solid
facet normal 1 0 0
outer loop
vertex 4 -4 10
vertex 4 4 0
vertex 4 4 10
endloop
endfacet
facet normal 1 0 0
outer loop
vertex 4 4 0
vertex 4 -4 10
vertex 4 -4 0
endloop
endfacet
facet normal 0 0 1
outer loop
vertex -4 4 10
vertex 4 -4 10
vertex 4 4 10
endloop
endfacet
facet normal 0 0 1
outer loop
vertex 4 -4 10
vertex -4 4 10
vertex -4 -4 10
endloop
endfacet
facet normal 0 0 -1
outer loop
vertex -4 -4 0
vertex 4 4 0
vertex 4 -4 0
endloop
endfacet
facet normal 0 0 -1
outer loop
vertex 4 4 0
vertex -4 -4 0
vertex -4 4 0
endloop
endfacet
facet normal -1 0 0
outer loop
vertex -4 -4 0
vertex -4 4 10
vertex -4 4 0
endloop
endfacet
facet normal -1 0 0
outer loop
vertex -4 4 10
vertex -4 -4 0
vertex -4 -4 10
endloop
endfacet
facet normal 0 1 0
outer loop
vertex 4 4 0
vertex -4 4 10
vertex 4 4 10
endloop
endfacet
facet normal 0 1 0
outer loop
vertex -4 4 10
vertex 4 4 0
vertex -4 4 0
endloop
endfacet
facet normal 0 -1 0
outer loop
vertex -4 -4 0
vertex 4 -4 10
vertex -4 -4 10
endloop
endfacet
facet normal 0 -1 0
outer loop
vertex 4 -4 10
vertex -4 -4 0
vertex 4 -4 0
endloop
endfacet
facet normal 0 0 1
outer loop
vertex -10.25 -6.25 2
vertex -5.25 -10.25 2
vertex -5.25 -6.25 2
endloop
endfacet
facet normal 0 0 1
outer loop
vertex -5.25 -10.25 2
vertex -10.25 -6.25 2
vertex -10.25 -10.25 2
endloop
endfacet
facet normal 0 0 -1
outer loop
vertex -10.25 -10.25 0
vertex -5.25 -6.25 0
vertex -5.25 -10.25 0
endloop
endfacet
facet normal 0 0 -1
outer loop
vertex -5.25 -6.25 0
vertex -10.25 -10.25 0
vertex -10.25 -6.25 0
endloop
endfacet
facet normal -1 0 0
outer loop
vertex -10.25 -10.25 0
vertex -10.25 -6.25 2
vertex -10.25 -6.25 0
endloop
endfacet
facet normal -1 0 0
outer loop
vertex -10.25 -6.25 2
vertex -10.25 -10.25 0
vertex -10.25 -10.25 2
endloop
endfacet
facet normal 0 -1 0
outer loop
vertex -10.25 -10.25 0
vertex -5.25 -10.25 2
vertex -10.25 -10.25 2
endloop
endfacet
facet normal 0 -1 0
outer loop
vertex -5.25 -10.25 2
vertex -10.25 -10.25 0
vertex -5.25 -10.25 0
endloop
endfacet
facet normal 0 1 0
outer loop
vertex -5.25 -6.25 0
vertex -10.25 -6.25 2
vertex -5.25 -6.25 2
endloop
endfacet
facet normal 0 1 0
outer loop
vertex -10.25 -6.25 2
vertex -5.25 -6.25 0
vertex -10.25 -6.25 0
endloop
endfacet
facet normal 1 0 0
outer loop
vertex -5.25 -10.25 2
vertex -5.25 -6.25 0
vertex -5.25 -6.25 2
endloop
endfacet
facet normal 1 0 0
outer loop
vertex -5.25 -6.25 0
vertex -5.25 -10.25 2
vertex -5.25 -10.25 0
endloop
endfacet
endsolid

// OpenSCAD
translate([0, 0, 5]) color([0,1,0,0.9]) cube([8, 8, 10], center=true);
translate([-10.0, -10.0, 1]) color([1,0,0]) cube([0.5, 0.5, 2], center=true);
translate([-10.0, -9.5, 1]) color([1,0,0]) cube([0.5, 0.5, 2], center=true);
translate([-10.0, -9.0, 1]) color([1,0,0]) cube([0.5, 0.5, 2], center=true);
translate([-10.0, -8.5, 1]) color([1,0,0]) cube([0.5, 0.5, 2], center=true);
translate([-10.0, -8.0, 1]) color([1,0,0]) cube([0.5, 0.5, 2], center=true);
translate([-10.0, -7.5, 1]) color([1,0,0]) cube([0.5, 0.5, 2], center=true);
translate([-10.0, -7.0, 1]) color([1,0,0]) cube([0.5, 0.5, 2], center=true);
translate([-10.0, -6.5, 1]) color([1,0,0]) cube([0.5, 0.5, 2], center=true);
translate([-9.5, -10.0, 1]) color([1,0,0]) cube([0.5, 0.5, 2], center=true);
translate([-9.5, -9.5, 1]) color([1,0,0]) cube([0.5, 0.5, 2], center=true);
translate([-9.5, -9.0, 1]) color([1,0,0]) cube([0.5, 0.5, 2], center=true);
translate([-9.5, -8.5, 1]) color([1,0,0]) cube([0.5, 0.5, 2], center=true);
translate([-9.5, -8.0, 1]) color([1,0,0]) cube([0.5, 0.5, 2], center=true);
translate([-9.5, -7.5, 1]) color([1,0,0]) cube([0.5, 0.5, 2], center=true);
translate([-9.5, -7.0, 1]) color([1,0,0]) cube([0.5, 0.5, 2], center=true);
translate([-9.5, -6.5, 1]) color([1,0,0]) cube([0.5, 0.5, 2], center=true);
translate([-9.0, -10.0, 1]) color([1,0,0]) cube([0.5, 0.5, 2], center=true);
translate([-9.0, -9.5, 1]) color([1,0,0]) cube([0.5, 0.5, 2], center=true);
translate([-9.0, -9.0, 1]) color([1,0,0]) cube([0.5, 0.5, 2], center=true);
translate([-9.0, -8.5, 1]) color([1,0,0]) cube([0.5, 0.5, 2], center=true);
translate([-9.0, -8.0, 1]) color([1,0,0]) cube([0.5, 0.5, 2], center=true);
translate([-9.0, -7.5, 1]) color([1,0,0]) cube([0.5, 0.5, 2], center=true);
translate([-9.0, -7.0, 1]) color([1,0,0]) cube([0.5, 0.5, 2], center=true);
translate([-9.0, -6.5, 1]) color([1,0,0]) cube([0.5, 0.5, 2], center=true);
translate([-8.5, -10.0, 1]) color([1,0,0]) cube([0.5, 0.5, 2], center=true);
translate([-8.5, -9.5, 1]) color([1,0,0]) cube([0.5, 0.5, 2], center=true);
translate([-8.5, -9.0, 1]) color([1,0,0]) cube([0.5, 0.5, 2], center=true);
translate([-8.5, -8.5, 1]) color([1,0,0]) cube([0.5, 0.5, 2], center=true);
translate([-8.5, -8.0, 1]) color([1,0,0]) cube([0.5, 0.5, 2], center=true);
translate([-8.5, -7.5, 1]) color([1,0,0]) cube([0.5, 0.5, 2], center=true);
translate([-8.5, -7.0, 1]) color([1,0,0]) cube([0.5, 0.5, 2], center=true);
translate([-8.5, -6.5, 1]) color([1,0,0]) cube([0.5, 0.5, 2], center=true);
translate([-8.0, -10.0, 1]) color([1,0,0]) cube([0.5, 0.5, 2], center=true);
translate([-8.0, -9.5, 1]) color([1,0,0]) cube([0.5, 0.5, 2], center=true);
translate([-8.0, -9.0, 1]) color([1,0,0]) cube([0.5, 0.5, 2], center=true);
translate([-8.0, -8.5, 1]) color([1,0,0]) cube([0.5, 0.5, 2], center=true);
translate([-8.0, -8.0, 1]) color([1,0,0]) cube([0.5, 0.5, 2], center=true);
translate([-8.0, -7.5, 1]) color([1,0,0]) cube([0.5, 0.5, 2], center=true);
translate([-8.0, -7.0, 1]) color([1,0,0]) cube([0.5, 0.5, 2], center=true);
translate([-8.0, -6.5, 1]) color([1,0,0]) cube([0.5, 0.5, 2], center=true);
translate([-7.5, -10.0, 1]) color([1,0,0]) cube([0.5, 0.5, 2], center=true);
translate([-7.5, -9.5, 1]) color([1,0,0]) cube([0.5, 0.5, 2], center=true);
translate([-7.5, -9.0, 1]) color([1,0,0]) cube([0.5, 0.5, 2], center=true);
translate([-7.5, -8.5, 1]) color([1,0,0]) cube([0.5, 0.5, 2], center=true);
translate([-7.5, -8.0, 1]) color([1,0,0]) cube([0.5, 0.5, 2], center=true);
translate([-7.5, -7.5, 1]) color([1,0,0]) cube([0.5, 0.5, 2], center=true);
translate([-7.5, -7.0, 1]) color([1,0,0]) cube([0.5, 0.5, 2], center=true);
translate([-7.5, -6.5, 1]) color([1,0,0]) cube([0.5, 0.5, 2], center=true);
translate([-7.0, -10.0, 1]) color([1,0,0]) cube([0.5, 0.5, 2], center=true);
translate([-7.0, -9.5, 1]) color([1,0,0]) cube([0.5, 0.5, 2], center=true);
translate([-7.0, -9.0, 1]) color([1,0,0]) cube([0.5, 0.5, 2], center=true);
translate([-7.0, -8.5, 1]) color([1,0,0]) cube([0.5, 0.5, 2], center=true);
translate([-7.0, -8.0, 1]) color([1,0,0]) cube([0.5, 0.5, 2], center=true);
translate([-7.0, -7.5, 1]) color([1,0,0]) cube([0.5, 0.5, 2], center=true);
translate([-7.0, -7.0, 1]) color([1,0,0]) cube([0.5, 0.5, 2], center=true);
translate([-7.0, -6.5, 1]) color([1,0,0]) cube([0.5, 0.5, 2], center=true);
translate([-6.5, -10.0, 1]) color([1,0,0]) cube([0.5, 0.5, 2], center=true);
translate([-6.5, -9.5, 1]) color([1,0,0]) cube([0.5, 0.5, 2], center=true);
translate([-6.5, -9.0, 1]) color([1,0,0]) cube([0.5, 0.5, 2], center=true);
translate([-6.5, -8.5, 1]) color([1,0,0]) cube([0.5, 0.5, 2], center=true);
translate([-6.5, -8.0, 1]) color([1,0,0]) cube([0.5, 0.5, 2], center=true);
translate([-6.5, -7.5, 1]) color([1,0,0]) cube([0.5, 0.5, 2], center=true);
translate([-6.5, -7.0, 1]) color([1,0,0]) cube([0.5, 0.5, 2], center=true);
translate([-6.5, -6.5, 1]) color([1,0,0]) cube([0.5, 0.5, 2], center=true);
translate([-6.0, -10.0, 1]) color([1,0,0]) cube([0.5, 0.5, 2], center=true);
translate([-6.0, -9.5, 1]) color([1,0,0]) cube([0.5, 0.5, 2], center=true);
translate([-6.0, -9.0, 1]) color([1,0,0]) cube([0.5, 0.5, 2], center=true);
translate([-6.0, -8.5, 1]) color([1,0,0]) cube([0.5, 0.5, 2], center=true);
translate([-6.0, -8.0, 1]) color([1,0,0]) cube([0.5, 0.5, 2], center=true);
translate([-6.0, -7.5, 1]) color([1,0,0]) cube([0.5, 0.5, 2], center=true);
translate([-6.0, -7.0, 1]) color([1,0,0]) cube([0.5, 0.5, 2], center=true);
translate([-6.0, -6.5, 1]) color([1,0,0]) cube([0.5, 0.5, 2], center=true);
translate([-5.5, -10.0, 1]) color([1,0,0]) cube([0.5, 0.5, 2], center=true);
translate([-5.5, -9.5, 1]) color([1,0,0]) cube([0.5, 0.5, 2], center=true);
translate([-5.5, -9.0, 1]) color([1,0,0]) cube([0.5, 0.5, 2], center=true);
translate([-5.5, -8.5, 1]) color([1,0,0]) cube([0.5, 0.5, 2], center=true);
translate([-5.5, -8.0, 1]) color([1,0,0]) cube([0.5, 0.5, 2], center=true);
translate([-5.5, -7.5, 1]) color([1,0,0]) cube([0.5, 0.5, 2], center=true);
translate([-5.5, -7.0, 1]) color([1,0,0]) cube([0.5, 0.5, 2], center=true);
translate([-5.5, -6.5, 1]) color([1,0,0]) cube([0.5, 0.5, 2], center=true);
